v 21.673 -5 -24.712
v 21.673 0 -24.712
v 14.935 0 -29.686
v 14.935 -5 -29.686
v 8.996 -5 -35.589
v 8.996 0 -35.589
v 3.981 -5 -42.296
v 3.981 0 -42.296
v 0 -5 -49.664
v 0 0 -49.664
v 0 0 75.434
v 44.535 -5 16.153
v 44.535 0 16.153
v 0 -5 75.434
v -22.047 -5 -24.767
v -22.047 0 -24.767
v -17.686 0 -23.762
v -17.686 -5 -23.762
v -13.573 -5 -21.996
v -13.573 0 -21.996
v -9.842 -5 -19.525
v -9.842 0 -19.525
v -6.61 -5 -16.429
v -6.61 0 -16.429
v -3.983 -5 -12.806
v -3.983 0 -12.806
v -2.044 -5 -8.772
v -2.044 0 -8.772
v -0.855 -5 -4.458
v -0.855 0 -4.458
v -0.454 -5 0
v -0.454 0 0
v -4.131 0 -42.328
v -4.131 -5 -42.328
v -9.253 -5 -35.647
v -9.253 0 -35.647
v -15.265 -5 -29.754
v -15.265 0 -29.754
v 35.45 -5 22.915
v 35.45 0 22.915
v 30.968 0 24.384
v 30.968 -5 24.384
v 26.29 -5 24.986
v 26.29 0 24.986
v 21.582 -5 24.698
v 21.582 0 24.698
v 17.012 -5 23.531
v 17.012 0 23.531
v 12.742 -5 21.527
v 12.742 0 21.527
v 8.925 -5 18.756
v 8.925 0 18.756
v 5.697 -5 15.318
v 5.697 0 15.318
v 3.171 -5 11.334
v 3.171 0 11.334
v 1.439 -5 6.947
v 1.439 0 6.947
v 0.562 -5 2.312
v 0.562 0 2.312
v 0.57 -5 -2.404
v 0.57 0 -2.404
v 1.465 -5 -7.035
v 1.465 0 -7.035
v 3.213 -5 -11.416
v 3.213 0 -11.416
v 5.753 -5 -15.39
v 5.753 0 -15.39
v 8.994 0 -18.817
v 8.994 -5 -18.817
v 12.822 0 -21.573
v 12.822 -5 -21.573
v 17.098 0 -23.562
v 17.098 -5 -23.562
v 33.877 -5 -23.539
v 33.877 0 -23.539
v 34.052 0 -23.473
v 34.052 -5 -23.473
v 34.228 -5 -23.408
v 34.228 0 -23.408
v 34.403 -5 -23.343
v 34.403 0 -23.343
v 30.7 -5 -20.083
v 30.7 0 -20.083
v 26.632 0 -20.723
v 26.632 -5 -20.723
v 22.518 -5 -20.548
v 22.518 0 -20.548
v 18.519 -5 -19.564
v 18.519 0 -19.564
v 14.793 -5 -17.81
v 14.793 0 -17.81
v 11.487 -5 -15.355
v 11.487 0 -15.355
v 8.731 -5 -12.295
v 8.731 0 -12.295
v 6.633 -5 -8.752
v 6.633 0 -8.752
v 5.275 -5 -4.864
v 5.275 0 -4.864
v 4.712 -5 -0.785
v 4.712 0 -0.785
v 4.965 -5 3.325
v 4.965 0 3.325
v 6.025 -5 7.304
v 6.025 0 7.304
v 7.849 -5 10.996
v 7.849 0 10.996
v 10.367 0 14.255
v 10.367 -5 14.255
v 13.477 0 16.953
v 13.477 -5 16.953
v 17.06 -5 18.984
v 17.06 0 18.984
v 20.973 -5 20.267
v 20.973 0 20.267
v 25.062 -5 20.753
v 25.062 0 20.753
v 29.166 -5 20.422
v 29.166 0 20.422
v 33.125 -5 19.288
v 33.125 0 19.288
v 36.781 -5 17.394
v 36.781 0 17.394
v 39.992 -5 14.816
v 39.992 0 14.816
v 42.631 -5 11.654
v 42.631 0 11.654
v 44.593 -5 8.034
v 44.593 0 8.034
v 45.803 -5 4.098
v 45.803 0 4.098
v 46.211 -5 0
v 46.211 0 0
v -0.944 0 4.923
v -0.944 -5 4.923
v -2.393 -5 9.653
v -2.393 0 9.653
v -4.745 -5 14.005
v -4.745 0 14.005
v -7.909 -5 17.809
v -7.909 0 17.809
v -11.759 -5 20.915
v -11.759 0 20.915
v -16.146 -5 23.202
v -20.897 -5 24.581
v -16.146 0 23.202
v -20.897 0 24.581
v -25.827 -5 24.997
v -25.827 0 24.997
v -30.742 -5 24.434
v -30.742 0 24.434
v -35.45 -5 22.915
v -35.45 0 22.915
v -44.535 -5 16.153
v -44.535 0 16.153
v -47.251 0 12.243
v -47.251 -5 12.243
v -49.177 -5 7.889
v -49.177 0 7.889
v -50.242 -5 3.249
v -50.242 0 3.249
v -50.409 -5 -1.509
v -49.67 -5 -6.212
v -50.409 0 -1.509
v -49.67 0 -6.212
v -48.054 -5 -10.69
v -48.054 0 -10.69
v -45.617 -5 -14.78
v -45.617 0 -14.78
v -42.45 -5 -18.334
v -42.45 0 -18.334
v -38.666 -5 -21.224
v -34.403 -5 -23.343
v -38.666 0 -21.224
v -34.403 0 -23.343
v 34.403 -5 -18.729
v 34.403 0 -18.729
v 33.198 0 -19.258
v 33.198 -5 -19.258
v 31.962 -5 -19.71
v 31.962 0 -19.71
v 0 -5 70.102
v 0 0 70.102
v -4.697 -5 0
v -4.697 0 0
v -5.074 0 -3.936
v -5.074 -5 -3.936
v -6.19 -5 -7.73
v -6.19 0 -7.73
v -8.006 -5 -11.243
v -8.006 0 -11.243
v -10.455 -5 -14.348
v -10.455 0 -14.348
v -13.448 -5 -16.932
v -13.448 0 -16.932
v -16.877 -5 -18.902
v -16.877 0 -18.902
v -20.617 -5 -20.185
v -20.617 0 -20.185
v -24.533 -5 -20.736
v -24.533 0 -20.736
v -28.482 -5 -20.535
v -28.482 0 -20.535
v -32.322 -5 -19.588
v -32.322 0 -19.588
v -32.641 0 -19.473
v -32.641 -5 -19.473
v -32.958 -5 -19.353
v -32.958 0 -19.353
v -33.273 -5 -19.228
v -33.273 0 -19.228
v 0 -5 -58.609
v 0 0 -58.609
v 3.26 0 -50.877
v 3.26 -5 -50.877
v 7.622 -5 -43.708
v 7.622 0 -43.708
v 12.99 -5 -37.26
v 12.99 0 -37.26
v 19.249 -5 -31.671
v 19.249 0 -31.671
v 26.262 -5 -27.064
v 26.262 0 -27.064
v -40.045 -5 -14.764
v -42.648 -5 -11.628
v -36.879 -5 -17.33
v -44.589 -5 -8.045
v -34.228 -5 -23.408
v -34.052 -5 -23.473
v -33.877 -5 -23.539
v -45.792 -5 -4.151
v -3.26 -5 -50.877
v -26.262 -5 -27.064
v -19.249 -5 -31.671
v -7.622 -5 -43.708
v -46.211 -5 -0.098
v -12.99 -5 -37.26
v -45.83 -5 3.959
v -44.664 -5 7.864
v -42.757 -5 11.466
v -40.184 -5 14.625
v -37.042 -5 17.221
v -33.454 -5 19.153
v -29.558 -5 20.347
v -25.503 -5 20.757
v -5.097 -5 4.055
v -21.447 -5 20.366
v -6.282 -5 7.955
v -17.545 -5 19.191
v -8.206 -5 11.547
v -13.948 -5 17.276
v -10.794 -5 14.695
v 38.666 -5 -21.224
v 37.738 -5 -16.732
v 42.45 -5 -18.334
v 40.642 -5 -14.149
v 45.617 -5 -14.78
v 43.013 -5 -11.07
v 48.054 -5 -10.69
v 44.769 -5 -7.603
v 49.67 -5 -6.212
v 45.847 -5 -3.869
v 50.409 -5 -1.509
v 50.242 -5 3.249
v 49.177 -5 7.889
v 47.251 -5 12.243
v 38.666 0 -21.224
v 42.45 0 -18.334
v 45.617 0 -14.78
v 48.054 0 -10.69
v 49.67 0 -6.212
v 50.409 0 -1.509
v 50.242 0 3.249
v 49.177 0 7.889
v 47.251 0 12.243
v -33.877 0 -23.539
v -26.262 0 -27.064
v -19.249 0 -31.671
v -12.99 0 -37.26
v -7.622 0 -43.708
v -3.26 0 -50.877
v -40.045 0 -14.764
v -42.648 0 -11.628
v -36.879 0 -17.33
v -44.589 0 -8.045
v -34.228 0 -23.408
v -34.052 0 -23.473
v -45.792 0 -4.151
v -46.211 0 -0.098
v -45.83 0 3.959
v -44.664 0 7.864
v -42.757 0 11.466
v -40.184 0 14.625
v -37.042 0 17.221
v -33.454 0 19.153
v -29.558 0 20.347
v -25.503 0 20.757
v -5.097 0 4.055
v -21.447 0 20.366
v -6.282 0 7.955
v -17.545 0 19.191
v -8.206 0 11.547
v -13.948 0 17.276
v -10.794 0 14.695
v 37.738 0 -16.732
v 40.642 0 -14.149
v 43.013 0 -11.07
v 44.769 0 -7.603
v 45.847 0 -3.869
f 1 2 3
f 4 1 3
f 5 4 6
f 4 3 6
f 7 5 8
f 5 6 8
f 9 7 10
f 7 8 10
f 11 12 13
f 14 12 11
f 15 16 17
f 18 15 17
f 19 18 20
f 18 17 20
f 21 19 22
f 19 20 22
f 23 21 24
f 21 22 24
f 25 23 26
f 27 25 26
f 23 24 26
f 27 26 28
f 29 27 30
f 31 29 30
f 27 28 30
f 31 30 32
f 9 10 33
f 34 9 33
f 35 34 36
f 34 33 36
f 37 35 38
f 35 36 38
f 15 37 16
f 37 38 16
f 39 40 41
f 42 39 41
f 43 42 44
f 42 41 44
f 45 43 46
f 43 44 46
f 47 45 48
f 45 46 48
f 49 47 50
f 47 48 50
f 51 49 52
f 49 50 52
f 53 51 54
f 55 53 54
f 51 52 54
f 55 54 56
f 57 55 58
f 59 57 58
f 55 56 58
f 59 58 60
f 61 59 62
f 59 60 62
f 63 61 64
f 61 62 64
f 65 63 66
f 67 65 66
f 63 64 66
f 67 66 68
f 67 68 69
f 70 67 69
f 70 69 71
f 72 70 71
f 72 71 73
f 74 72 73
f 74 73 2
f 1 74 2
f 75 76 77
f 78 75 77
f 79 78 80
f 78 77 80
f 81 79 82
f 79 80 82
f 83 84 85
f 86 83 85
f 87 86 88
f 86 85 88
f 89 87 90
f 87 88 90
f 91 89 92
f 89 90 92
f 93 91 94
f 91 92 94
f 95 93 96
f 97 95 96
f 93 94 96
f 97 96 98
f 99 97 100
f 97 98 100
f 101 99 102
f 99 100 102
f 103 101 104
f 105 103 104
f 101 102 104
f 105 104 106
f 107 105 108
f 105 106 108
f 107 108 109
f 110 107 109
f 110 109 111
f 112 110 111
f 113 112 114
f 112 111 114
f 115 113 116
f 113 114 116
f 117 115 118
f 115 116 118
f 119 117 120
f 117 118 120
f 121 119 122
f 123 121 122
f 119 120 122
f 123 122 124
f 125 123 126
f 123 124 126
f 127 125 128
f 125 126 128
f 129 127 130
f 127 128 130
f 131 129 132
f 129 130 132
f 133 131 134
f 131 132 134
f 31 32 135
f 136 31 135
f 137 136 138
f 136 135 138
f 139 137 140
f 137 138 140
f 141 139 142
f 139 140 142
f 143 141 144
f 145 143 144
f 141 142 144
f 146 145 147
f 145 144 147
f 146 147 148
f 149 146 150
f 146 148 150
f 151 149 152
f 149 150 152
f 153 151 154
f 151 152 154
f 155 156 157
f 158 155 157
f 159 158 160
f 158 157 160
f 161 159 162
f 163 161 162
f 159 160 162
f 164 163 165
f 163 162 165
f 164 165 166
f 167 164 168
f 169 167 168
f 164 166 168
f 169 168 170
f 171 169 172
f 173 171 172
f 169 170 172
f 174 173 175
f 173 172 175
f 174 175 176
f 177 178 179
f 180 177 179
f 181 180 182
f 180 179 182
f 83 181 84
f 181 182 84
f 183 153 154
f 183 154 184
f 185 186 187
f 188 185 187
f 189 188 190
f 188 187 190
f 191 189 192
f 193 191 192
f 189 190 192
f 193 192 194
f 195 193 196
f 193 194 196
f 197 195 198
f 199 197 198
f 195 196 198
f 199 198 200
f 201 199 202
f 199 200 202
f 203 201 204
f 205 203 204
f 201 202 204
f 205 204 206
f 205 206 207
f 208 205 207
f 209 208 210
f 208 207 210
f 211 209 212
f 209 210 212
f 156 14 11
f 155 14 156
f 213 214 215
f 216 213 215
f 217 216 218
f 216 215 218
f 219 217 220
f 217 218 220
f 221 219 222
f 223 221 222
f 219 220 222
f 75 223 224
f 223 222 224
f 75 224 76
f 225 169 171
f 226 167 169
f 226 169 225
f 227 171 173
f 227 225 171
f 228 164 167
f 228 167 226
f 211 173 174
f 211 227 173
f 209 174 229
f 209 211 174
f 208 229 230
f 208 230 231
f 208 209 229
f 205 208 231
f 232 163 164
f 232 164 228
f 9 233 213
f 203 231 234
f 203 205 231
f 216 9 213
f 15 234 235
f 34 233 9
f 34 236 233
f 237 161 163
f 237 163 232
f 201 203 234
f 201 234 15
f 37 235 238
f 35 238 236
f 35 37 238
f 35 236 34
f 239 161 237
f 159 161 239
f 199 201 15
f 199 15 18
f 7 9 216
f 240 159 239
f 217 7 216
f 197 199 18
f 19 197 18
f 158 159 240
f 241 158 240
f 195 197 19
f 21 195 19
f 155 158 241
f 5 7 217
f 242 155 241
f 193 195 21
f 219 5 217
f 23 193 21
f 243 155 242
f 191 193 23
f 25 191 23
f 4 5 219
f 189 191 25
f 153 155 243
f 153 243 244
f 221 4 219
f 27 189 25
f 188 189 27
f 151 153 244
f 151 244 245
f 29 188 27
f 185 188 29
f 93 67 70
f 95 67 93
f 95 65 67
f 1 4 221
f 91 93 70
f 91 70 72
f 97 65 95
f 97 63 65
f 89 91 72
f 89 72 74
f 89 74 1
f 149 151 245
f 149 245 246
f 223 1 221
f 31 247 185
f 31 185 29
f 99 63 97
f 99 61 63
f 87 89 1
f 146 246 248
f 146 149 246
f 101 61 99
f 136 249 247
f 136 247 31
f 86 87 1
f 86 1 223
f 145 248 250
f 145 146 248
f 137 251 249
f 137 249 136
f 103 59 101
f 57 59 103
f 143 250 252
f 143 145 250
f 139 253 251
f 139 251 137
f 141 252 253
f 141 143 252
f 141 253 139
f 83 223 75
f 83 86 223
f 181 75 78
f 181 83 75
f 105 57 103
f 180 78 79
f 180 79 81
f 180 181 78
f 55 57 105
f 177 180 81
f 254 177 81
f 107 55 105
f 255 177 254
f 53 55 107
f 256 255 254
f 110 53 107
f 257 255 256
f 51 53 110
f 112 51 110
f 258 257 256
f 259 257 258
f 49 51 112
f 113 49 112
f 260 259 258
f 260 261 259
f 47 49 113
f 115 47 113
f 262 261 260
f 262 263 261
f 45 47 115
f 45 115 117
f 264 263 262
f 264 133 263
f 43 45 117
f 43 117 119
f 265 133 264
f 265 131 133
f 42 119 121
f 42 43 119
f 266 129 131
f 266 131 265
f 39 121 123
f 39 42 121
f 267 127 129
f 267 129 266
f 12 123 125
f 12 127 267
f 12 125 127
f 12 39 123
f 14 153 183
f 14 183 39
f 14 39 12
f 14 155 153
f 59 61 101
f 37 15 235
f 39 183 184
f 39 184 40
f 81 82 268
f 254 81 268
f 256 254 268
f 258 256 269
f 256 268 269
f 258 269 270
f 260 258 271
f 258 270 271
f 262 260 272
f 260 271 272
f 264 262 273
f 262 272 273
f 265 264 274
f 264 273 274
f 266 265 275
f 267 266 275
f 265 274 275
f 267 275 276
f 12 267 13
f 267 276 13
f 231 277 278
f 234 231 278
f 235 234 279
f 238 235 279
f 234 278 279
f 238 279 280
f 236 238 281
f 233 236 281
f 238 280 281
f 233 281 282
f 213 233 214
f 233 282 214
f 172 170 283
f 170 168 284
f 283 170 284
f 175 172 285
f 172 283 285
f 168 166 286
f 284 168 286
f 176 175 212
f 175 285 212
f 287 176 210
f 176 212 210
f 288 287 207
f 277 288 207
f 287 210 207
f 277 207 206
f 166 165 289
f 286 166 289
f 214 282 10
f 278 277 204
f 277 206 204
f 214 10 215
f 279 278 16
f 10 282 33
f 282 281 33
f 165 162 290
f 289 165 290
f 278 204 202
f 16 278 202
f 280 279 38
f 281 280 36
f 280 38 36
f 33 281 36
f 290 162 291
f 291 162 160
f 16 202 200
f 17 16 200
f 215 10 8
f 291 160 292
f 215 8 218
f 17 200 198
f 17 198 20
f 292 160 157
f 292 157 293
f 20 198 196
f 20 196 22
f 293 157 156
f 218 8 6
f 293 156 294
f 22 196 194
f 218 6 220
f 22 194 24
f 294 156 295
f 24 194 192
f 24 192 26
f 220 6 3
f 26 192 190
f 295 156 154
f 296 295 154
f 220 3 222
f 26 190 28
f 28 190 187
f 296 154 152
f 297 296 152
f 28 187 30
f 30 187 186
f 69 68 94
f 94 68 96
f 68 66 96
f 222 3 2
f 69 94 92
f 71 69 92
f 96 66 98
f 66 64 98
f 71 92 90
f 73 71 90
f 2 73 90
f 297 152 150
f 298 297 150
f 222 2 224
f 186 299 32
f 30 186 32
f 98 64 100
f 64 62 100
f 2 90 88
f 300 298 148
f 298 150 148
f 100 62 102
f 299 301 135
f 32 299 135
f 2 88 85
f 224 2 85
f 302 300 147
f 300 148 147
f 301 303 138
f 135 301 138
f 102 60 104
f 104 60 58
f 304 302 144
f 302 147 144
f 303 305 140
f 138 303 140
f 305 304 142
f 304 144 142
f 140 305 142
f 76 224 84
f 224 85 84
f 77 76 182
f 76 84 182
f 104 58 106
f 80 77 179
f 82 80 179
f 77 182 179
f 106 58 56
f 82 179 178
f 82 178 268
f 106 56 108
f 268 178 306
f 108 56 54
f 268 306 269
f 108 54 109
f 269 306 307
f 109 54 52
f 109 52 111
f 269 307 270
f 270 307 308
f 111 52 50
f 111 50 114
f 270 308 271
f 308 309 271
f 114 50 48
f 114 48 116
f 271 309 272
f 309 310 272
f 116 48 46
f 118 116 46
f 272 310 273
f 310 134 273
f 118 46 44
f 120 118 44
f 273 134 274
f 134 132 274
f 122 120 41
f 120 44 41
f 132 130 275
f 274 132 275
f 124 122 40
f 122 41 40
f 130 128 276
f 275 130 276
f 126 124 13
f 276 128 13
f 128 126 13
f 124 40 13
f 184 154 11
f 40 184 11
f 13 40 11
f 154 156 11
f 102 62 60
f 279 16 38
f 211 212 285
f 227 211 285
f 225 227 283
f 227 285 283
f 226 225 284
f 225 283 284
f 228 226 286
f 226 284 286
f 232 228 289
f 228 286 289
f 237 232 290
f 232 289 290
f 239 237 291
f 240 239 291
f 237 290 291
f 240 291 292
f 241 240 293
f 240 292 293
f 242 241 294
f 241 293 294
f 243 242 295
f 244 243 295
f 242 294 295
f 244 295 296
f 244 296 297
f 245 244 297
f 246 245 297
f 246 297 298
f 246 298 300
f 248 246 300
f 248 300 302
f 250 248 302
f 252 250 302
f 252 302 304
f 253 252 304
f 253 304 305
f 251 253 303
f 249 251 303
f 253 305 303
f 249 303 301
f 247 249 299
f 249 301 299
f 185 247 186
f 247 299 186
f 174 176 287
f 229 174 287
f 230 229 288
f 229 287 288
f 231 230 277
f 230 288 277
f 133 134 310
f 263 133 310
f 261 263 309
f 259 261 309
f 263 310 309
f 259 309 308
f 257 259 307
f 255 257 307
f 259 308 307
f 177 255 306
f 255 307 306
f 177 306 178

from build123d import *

# Parameters (mm, degrees)
F1_DEPTH = 5
F3_DEPTH = 5


with BuildPart() as f1:
    # F0 (on Front) → F1 (new body)
    with BuildSketch(Plane.XZ):
        with BuildLine():
            ThreePointArc((-22.0468155789, -24.7666841827), (-6.6104134528, -16.4288071016), (-0.4543593565, 0))
            ThreePointArc((-0.4543593565, 0), (-39.618976734, 20.6000877316), (-34.4034485204, -23.3433888529))
            ThreePointArc((-34.4034485204, -23.3433888529), (-34.13988042, -23.4403115833), (-33.876793996, -23.5385342522))
            ThreePointArc((-33.876793996, -23.5385342522), (-28.0359035944, -24.8663553692), (-22.0468155789, -24.7666841827))
        make_face()
        with BuildLine():
            ThreePointArc((-4.6974495608, 0), (-13.4479875789, -16.9321097623), (-32.3216329124, -19.5880029144))
            ThreePointArc((-32.3216329124, -19.5880029144), (-32.7996241433, -19.4138195489), (-33.2732030007, -19.2279741089))
            ThreePointArc((-33.2732030007, -19.2279741089), (-37.0421605292, 17.2212708081), (-4.6974495608, 0))
        make_face(mode=Mode.SUBTRACT)
        with BuildLine():
            ThreePointArc((50.4543593565, 0), (25.4543593565, 25), (0.4543593565, 0))
            ThreePointArc((0.4543593565, 0), (6.4867521845, -16.2858797174), (21.67274961, -24.7123335144))
            ThreePointArc((21.67274961, -24.7123335144), (27.8478432396, -24.8851609378), (33.876793996, -23.5385342522))
            ThreePointArc((33.876793996, -23.5385342522), (34.13988042, -23.4403115833), (34.4034485204, -23.3433888529))
            ThreePointArc((34.4034485204, -23.3433888529), (46.0544470881, -14.1646173775), (50.4543593565, 0))
        make_face()
        with BuildLine():
            ThreePointArc((34.4034485204, -18.7286707324), (32.5837256191, -19.4941386308), (30.6995126262, -20.0832684452))
            ThreePointArc((30.6995126262, -20.0832684452), (9.0269055436, 12.6881072462), (46.2112691521, 0))
            ThreePointArc((46.2112691521, 0), (43.0129005942, -11.0700918636), (34.4034485204, -18.7286707324))
        make_face(mode=Mode.SUBTRACT)
        with BuildLine():
            ThreePointArc((0, -49.6637113392), (-9.2528617859, -35.6473438574), (-22.0468155789, -24.7666841827))
            ThreePointArc((-22.0468155789, -24.7666841827), (-28.0359035944, -24.8663553692), (-33.876793996, -23.5385342522))
            ThreePointArc((-33.876793996, -23.5385342522), (-12.9903930203, -37.2598807121), (0, -58.6085758378))
            Line((0, -58.6085758378), (0, -49.6637113392))
        make_face()
        with BuildLine():
            ThreePointArc((21.67274961, -24.7123335144), (8.9955723313, -35.5891026648), (0, -49.6637113392))
            Line((0, -49.6637113392), (0, -58.6085758378))
            ThreePointArc((0, -58.6085758378), (12.9903930203, -37.2598807121), (33.876793996, -23.5385342522))
            ThreePointArc((33.876793996, -23.5385342522), (27.8478432396, -24.8851609378), (21.67274961, -24.7123335144))
        make_face()
    extrude(amount=F1_DEPTH)

    # F2 (on face) → F3 (join)
    with BuildSketch(Plane.XZ.offset(5)):
        with BuildLine():
            Line((0, 75.4342153668), (-44.5349970754, 16.1533050563))
            ThreePointArc((-44.5349970754, 16.1533050563), (-40.3802571517, 20.0553627493), (-35.4496590764, 22.9149292713))
            Line((-35.4496590764, 22.9149292713), (0, 70.1022695262))
            Line((0, 70.1022695262), (35.4496590764, 22.9149292713))
            ThreePointArc((35.4496590764, 22.9149292713), (40.3802571517, 20.0553627493), (44.5349970754, 16.1533050563))
            Line((44.5349970754, 16.1533050563), (0, 75.4342153668))
        make_face()
    extrude(amount=-F3_DEPTH)


solid = f1.part
